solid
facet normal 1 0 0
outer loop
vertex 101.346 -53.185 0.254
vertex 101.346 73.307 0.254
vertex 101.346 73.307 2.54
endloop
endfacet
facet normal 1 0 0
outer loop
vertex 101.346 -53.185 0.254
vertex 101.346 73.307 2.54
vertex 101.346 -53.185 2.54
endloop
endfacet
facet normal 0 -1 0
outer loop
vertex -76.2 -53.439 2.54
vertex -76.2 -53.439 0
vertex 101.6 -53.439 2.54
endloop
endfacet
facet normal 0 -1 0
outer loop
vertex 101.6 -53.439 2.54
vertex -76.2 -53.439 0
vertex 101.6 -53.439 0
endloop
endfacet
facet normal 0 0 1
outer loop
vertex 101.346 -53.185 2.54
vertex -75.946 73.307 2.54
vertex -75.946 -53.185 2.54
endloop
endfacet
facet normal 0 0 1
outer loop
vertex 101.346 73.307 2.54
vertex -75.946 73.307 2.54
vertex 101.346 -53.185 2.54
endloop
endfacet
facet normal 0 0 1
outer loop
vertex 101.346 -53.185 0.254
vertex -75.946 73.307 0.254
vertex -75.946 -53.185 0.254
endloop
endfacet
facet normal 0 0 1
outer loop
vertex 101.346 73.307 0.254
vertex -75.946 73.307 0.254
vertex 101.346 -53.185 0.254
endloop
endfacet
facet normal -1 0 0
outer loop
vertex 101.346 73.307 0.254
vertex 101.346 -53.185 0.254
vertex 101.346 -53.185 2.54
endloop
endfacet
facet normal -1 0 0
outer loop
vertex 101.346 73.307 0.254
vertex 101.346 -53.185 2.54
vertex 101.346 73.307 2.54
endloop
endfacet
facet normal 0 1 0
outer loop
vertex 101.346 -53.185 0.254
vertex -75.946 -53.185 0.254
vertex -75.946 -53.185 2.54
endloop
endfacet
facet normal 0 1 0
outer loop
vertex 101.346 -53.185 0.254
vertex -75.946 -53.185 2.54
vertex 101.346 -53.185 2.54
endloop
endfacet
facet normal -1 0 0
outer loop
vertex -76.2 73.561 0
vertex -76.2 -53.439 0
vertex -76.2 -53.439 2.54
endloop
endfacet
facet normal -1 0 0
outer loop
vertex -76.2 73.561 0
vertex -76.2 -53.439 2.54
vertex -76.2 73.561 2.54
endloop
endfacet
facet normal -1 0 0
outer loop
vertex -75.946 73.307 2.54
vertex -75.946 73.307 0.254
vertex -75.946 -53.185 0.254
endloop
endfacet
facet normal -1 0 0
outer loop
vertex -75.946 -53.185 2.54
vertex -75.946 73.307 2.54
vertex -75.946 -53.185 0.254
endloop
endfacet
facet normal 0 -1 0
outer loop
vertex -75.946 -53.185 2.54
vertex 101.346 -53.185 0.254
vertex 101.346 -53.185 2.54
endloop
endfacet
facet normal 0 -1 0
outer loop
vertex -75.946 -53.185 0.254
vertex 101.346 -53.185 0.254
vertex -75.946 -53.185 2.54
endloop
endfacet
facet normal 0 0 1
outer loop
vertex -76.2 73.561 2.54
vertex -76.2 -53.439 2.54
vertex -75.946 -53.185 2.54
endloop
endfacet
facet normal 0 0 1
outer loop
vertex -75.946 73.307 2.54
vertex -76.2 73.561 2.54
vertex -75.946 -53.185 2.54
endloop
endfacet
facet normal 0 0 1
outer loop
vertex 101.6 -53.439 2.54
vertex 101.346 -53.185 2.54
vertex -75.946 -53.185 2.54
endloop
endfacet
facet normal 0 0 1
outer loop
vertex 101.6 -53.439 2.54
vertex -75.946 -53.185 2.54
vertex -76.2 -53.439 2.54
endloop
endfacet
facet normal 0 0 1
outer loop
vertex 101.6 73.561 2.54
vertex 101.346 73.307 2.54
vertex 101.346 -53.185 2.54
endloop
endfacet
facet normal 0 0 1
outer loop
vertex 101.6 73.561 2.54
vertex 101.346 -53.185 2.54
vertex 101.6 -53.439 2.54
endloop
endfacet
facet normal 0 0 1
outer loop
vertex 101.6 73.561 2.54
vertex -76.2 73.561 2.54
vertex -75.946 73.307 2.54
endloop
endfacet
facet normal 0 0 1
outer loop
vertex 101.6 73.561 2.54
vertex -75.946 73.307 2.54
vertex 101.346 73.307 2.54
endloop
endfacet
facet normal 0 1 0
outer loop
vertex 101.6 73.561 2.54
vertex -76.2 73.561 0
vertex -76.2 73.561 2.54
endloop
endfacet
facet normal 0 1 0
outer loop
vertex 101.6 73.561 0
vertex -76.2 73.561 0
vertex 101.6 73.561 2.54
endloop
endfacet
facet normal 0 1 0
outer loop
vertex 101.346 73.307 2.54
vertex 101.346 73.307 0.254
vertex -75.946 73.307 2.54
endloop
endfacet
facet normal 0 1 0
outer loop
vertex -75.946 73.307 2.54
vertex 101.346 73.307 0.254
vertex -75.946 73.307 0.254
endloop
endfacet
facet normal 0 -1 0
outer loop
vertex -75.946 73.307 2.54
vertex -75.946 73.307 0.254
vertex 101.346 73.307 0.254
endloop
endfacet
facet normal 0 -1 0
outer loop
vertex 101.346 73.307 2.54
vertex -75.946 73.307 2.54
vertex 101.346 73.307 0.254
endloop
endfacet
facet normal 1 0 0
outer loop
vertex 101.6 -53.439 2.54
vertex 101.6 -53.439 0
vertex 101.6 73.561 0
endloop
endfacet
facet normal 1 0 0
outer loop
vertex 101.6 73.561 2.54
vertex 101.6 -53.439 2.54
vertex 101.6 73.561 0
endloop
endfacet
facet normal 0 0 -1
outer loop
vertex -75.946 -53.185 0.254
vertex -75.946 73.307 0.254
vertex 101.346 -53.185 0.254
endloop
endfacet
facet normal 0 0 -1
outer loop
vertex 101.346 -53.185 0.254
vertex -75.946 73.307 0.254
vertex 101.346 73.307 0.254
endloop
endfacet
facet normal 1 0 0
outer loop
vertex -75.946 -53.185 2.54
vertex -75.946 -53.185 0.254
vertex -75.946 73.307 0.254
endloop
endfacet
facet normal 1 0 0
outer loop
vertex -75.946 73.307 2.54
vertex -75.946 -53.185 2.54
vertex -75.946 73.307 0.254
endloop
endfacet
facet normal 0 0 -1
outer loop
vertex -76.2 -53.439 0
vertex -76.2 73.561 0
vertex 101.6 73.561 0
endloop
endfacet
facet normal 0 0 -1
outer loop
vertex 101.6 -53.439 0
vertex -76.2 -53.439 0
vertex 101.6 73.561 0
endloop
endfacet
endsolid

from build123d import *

# Parameters (mm, degrees)
F0_W     = 177.8
F0_H     = 127
F0_W_2   = 177.292
F0_H_2   = 126.492
F1_DEPTH = 0.254
F2_DEPTH = 2.54
F3_DEPTH = 2.286


with BuildPart() as f1:
    # F0 (on Top) → F1 (new body)
    with BuildSketch(Plane.XY):
        with Locations((12.7000018626, 10.0612770415)):
            Rectangle(F0_W, F0_H)
        with Locations((12.7000018626, 10.0612770415)):
            Rectangle(F0_W_2, F0_H_2, mode=Mode.SUBTRACT)
        with Locations((12.7000018626, 10.0612770415)):
            Rectangle(F0_W_2, F0_H_2)
    extrude(amount=F1_DEPTH)

    # F0 (on Top) → F2 (join)
    with BuildSketch(Plane.XY):
        with Locations((12.7000018626, 10.0612770415)):
            Rectangle(F0_W, F0_H)
        with Locations((12.7000018626, 10.0612770415)):
            Rectangle(F0_W_2, F0_H_2, mode=Mode.SUBTRACT)
    extrude(amount=F2_DEPTH)


with BuildPart() as f3:
    # F3 (new, through all): a face of the model
    f3_faces = [f1.part.faces().sort_by_distance(p)[0] for p in [
        (12.7000018626, 10.0612770415, 0.254),
    ]]
    extrude(f3_faces, amount=F3_DEPTH)


solid = Compound([f1.part, f3.part])
